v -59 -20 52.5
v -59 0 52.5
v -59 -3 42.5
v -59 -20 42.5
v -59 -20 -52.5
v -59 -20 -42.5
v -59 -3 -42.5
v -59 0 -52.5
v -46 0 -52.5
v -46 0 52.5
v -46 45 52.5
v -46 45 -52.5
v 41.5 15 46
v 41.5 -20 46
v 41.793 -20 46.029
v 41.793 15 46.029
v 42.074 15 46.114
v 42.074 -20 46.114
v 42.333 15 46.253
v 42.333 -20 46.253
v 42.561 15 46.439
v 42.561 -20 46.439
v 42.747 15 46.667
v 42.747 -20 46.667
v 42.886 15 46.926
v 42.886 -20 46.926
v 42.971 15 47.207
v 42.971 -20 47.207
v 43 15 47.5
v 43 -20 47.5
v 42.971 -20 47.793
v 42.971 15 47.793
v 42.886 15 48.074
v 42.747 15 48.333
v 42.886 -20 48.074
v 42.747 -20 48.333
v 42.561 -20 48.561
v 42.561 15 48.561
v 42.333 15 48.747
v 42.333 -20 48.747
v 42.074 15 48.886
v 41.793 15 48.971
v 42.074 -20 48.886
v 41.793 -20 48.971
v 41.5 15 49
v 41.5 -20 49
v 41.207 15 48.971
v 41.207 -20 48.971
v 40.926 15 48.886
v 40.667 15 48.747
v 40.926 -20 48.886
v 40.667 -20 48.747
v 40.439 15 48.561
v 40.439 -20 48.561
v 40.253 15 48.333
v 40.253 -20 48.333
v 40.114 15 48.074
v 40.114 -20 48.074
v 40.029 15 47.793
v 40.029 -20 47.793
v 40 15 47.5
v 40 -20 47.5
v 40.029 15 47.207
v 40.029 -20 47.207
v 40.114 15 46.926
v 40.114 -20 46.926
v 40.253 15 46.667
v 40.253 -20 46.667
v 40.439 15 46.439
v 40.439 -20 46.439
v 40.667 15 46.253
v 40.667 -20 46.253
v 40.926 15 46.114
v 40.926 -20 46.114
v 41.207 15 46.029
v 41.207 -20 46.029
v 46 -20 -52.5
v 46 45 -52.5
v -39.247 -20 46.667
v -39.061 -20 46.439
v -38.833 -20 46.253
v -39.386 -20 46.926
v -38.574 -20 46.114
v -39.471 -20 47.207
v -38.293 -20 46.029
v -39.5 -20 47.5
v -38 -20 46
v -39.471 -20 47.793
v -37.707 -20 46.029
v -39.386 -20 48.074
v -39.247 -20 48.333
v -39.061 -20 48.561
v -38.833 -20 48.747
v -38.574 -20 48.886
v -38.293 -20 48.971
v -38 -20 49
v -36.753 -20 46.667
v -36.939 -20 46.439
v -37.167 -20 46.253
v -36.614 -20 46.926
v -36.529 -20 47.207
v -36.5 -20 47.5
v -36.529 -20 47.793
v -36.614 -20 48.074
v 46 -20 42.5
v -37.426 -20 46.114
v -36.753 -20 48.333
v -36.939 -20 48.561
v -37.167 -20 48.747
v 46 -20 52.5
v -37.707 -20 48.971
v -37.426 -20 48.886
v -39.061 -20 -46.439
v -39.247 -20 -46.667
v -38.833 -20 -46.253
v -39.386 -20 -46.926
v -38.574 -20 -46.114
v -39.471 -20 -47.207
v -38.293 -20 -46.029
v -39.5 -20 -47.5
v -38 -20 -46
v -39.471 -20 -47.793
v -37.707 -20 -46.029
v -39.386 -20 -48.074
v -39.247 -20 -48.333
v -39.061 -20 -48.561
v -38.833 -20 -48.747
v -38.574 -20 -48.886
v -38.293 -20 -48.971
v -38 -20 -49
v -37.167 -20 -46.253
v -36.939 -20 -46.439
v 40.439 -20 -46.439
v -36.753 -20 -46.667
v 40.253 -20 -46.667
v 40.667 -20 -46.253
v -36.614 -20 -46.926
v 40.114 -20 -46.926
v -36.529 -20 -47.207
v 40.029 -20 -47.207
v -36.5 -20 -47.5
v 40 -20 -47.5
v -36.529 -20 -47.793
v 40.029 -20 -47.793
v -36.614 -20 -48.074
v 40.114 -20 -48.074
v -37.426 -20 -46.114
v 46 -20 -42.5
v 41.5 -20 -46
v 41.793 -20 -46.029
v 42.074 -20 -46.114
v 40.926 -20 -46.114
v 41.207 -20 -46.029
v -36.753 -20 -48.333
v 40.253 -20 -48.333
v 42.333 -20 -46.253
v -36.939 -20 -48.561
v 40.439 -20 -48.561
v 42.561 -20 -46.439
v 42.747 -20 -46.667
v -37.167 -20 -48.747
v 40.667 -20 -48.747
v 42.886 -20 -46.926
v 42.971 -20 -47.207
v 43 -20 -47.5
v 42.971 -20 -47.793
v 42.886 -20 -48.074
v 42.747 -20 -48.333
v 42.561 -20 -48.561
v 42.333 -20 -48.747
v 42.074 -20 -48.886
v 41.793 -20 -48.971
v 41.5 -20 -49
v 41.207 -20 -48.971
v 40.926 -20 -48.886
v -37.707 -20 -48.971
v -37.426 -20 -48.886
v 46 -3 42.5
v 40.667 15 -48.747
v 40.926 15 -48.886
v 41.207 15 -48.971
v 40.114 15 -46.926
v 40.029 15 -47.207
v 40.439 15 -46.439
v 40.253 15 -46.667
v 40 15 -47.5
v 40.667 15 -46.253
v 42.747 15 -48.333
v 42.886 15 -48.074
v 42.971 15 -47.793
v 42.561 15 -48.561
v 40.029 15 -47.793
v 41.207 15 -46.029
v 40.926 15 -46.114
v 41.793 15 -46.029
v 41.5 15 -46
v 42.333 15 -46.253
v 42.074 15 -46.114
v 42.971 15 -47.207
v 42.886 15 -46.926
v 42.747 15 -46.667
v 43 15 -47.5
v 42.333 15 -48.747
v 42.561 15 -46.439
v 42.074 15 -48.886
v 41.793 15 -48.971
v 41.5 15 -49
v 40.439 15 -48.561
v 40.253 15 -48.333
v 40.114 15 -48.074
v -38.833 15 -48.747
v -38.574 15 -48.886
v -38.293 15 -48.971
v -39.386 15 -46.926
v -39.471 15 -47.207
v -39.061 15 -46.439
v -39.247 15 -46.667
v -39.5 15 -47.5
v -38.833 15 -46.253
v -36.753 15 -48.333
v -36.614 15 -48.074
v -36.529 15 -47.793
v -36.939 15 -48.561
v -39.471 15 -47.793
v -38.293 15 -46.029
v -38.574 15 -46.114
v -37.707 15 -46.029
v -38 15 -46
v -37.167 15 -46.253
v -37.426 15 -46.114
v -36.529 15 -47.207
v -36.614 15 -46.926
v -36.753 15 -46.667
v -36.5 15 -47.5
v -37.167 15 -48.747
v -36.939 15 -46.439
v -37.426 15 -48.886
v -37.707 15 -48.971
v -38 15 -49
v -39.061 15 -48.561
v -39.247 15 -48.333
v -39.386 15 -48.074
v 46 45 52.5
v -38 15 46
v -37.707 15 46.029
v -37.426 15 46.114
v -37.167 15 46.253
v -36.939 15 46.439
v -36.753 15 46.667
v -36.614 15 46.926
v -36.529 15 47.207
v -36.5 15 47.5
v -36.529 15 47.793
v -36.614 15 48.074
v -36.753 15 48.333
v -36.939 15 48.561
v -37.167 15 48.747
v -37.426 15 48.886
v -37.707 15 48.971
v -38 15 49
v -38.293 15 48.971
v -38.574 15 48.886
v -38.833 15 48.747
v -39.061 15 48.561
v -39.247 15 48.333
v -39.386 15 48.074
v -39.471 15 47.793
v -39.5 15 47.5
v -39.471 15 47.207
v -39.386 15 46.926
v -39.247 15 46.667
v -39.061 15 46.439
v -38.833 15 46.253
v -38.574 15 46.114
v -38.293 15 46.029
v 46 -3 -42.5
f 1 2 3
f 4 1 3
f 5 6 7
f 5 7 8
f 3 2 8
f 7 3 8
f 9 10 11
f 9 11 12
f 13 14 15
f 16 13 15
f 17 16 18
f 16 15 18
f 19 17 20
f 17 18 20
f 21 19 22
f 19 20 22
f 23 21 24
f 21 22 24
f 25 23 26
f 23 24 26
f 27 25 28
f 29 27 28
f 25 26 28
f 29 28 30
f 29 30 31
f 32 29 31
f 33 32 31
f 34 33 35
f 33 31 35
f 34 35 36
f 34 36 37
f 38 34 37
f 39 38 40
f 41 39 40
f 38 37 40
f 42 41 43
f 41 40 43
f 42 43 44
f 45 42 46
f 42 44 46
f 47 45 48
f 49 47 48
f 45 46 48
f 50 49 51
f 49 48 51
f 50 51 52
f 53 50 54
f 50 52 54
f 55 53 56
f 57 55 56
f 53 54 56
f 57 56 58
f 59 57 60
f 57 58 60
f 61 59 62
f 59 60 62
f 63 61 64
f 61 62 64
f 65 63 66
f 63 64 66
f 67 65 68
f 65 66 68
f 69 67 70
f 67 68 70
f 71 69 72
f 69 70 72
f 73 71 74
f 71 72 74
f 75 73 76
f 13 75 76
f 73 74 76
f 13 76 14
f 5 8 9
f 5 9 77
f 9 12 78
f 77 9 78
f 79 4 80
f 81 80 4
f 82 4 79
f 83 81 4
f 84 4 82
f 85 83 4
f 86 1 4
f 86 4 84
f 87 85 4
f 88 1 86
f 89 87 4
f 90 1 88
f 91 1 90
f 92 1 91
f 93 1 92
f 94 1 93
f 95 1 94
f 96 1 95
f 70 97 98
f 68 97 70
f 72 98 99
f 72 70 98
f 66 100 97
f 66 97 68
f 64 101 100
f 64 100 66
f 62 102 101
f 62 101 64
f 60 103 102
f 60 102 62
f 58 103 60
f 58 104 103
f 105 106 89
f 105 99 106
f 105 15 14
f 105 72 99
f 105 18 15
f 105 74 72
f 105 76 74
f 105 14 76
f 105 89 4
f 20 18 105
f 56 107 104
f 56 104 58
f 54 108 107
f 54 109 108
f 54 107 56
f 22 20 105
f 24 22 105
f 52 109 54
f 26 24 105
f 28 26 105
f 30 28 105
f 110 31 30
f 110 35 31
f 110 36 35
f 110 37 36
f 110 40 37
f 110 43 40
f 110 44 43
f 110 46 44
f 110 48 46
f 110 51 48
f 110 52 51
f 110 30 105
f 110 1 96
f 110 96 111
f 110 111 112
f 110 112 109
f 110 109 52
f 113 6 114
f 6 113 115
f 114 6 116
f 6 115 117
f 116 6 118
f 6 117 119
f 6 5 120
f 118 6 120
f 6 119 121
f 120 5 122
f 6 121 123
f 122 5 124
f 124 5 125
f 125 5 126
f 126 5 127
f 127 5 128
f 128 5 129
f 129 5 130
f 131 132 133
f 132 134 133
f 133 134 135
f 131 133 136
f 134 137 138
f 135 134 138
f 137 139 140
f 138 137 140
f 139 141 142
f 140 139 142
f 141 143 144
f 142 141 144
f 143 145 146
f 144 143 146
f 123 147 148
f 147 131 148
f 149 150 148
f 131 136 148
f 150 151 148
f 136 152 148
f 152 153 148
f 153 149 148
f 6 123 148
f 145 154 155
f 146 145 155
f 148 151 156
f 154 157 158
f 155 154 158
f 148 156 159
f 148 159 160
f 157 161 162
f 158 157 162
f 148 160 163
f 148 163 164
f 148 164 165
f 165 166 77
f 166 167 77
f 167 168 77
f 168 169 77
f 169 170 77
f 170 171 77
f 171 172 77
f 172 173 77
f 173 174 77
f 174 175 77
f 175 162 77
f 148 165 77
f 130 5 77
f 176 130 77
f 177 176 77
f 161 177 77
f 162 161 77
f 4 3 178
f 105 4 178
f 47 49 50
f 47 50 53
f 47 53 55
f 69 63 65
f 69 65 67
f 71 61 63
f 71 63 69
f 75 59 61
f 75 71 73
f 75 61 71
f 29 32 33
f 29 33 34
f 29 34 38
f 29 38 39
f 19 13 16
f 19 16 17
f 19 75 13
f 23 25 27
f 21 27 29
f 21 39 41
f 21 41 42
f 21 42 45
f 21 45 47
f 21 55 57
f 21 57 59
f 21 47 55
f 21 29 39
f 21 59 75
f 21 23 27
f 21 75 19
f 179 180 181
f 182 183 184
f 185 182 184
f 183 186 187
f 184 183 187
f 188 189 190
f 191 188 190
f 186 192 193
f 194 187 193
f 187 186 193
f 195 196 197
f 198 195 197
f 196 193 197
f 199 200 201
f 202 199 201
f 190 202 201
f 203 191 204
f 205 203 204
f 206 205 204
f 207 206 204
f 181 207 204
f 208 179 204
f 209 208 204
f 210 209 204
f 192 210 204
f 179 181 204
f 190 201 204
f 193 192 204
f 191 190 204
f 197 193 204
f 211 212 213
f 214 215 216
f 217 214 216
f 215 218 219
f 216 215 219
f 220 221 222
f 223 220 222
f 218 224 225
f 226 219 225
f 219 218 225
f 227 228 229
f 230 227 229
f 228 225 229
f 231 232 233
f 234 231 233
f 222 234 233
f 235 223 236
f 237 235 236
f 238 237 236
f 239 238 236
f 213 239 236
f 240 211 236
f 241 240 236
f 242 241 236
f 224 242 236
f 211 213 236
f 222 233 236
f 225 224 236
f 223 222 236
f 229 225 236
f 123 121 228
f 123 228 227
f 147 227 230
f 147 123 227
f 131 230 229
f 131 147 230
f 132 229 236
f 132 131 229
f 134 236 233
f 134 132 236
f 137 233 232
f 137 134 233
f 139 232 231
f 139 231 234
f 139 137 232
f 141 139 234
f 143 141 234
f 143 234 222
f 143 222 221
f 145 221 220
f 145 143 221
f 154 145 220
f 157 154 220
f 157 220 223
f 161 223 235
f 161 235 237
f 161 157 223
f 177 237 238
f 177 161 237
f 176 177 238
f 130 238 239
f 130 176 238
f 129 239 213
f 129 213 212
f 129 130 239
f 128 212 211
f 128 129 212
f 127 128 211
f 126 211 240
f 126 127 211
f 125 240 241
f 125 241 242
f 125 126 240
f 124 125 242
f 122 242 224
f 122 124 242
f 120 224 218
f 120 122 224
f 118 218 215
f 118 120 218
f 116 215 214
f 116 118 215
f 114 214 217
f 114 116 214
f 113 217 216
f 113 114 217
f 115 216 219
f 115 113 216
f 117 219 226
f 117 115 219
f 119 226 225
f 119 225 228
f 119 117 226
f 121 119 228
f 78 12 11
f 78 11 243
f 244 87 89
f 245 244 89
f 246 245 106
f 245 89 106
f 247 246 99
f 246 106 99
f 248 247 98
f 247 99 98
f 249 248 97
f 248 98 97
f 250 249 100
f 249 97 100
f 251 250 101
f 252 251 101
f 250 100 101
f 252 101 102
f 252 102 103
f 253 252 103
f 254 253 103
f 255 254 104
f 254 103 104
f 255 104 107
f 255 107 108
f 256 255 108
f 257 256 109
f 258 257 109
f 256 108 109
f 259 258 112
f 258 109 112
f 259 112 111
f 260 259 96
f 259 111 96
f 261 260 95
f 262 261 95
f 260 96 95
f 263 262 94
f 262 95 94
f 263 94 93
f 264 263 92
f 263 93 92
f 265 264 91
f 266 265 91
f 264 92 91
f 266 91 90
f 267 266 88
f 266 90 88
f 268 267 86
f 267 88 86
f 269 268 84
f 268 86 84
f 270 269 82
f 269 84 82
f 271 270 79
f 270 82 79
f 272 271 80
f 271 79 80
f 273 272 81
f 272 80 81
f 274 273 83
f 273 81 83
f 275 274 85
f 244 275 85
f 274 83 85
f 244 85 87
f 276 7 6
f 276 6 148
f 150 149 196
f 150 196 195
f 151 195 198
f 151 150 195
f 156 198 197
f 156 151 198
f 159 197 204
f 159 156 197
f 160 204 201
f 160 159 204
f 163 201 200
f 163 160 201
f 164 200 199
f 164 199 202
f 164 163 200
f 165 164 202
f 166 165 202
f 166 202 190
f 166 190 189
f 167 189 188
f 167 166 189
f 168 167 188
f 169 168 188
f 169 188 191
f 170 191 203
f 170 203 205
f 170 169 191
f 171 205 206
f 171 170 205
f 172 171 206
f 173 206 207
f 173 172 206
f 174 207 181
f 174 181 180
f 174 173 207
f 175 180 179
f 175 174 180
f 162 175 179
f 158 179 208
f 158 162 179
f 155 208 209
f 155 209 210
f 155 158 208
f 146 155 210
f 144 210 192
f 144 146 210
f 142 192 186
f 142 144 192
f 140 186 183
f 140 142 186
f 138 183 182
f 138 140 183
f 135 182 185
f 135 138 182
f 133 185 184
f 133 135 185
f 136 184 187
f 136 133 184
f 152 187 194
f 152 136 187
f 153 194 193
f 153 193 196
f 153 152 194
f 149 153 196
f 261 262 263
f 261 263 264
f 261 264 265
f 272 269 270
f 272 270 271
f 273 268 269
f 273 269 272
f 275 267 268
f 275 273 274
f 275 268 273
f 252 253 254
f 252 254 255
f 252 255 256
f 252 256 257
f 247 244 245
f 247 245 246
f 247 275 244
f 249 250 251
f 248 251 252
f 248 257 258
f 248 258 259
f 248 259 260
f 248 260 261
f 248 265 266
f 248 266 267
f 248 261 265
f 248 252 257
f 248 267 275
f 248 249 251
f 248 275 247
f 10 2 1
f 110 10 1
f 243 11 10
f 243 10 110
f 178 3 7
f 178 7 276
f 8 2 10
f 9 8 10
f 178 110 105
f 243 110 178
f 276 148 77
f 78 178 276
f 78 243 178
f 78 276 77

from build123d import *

# Parameters (mm, degrees)
SKETCH1_W           = 92
SKETCH1_H           = 105
BOSS_EXTRUDE1_DEPTH = 45
SKETCH2_W           = 105
SKETCH2_H           = 105
BOSS_EXTRUDE2_DEPTH = 3
SKETCH3_W           = 105
SKETCH3_H           = 10
BOSS_EXTRUDE3_DEPTH = 17
SKETCH4_R           = 1.5
CUT_EXTRUDE1_DEPTH  = 35


with BuildPart() as part:
    # Sketch1 → Boss-Extrude1 (new body)
    with BuildSketch(Plane(origin=(0, 0, 0), x_dir=(1, 0, 0), z_dir=(0, 1, 0))):
        Rectangle(SKETCH1_W, SKETCH1_H)
    extrude(amount=BOSS_EXTRUDE1_DEPTH)

    # Sketch2 → Boss-Extrude2 (add)
    with BuildSketch(Plane.XZ):
        with Locations((-6.5, 0)):
            Rectangle(SKETCH2_W, SKETCH2_H)
    extrude(amount=BOSS_EXTRUDE2_DEPTH)

    # Sketch3 → Boss-Extrude3 (add)
    with BuildSketch(Plane.XZ.offset(3)):
        with Locations((-6.5, 47.5)):
            Rectangle(SKETCH3_W, SKETCH3_H)
    boss_extrude3 = extrude(amount=BOSS_EXTRUDE3_DEPTH)

    # Sketch4 → Cut-Extrude1 (cut)
    with BuildSketch(Plane(origin=(0, -20, 0), x_dir=(-1, 0, 0), z_dir=(0, -1, 0))):
        with Locations(Location((-41.5, -47.5, 0), (0, 0, 90))):
            Circle(SKETCH4_R)
        with Locations(Location((38, -47.5, 0), (0, 0, 90))):
            Circle(SKETCH4_R)
    cut_extrude1 = extrude(amount=-CUT_EXTRUDE1_DEPTH, mode=Mode.SUBTRACT)

    # Mirror1: Boss-Extrude3, Cut-Extrude1 across plane
    add(boss_extrude3.mirror(Plane.XY))
    add(cut_extrude1.mirror(Plane.XY), mode=Mode.SUBTRACT)


solid = part.part
